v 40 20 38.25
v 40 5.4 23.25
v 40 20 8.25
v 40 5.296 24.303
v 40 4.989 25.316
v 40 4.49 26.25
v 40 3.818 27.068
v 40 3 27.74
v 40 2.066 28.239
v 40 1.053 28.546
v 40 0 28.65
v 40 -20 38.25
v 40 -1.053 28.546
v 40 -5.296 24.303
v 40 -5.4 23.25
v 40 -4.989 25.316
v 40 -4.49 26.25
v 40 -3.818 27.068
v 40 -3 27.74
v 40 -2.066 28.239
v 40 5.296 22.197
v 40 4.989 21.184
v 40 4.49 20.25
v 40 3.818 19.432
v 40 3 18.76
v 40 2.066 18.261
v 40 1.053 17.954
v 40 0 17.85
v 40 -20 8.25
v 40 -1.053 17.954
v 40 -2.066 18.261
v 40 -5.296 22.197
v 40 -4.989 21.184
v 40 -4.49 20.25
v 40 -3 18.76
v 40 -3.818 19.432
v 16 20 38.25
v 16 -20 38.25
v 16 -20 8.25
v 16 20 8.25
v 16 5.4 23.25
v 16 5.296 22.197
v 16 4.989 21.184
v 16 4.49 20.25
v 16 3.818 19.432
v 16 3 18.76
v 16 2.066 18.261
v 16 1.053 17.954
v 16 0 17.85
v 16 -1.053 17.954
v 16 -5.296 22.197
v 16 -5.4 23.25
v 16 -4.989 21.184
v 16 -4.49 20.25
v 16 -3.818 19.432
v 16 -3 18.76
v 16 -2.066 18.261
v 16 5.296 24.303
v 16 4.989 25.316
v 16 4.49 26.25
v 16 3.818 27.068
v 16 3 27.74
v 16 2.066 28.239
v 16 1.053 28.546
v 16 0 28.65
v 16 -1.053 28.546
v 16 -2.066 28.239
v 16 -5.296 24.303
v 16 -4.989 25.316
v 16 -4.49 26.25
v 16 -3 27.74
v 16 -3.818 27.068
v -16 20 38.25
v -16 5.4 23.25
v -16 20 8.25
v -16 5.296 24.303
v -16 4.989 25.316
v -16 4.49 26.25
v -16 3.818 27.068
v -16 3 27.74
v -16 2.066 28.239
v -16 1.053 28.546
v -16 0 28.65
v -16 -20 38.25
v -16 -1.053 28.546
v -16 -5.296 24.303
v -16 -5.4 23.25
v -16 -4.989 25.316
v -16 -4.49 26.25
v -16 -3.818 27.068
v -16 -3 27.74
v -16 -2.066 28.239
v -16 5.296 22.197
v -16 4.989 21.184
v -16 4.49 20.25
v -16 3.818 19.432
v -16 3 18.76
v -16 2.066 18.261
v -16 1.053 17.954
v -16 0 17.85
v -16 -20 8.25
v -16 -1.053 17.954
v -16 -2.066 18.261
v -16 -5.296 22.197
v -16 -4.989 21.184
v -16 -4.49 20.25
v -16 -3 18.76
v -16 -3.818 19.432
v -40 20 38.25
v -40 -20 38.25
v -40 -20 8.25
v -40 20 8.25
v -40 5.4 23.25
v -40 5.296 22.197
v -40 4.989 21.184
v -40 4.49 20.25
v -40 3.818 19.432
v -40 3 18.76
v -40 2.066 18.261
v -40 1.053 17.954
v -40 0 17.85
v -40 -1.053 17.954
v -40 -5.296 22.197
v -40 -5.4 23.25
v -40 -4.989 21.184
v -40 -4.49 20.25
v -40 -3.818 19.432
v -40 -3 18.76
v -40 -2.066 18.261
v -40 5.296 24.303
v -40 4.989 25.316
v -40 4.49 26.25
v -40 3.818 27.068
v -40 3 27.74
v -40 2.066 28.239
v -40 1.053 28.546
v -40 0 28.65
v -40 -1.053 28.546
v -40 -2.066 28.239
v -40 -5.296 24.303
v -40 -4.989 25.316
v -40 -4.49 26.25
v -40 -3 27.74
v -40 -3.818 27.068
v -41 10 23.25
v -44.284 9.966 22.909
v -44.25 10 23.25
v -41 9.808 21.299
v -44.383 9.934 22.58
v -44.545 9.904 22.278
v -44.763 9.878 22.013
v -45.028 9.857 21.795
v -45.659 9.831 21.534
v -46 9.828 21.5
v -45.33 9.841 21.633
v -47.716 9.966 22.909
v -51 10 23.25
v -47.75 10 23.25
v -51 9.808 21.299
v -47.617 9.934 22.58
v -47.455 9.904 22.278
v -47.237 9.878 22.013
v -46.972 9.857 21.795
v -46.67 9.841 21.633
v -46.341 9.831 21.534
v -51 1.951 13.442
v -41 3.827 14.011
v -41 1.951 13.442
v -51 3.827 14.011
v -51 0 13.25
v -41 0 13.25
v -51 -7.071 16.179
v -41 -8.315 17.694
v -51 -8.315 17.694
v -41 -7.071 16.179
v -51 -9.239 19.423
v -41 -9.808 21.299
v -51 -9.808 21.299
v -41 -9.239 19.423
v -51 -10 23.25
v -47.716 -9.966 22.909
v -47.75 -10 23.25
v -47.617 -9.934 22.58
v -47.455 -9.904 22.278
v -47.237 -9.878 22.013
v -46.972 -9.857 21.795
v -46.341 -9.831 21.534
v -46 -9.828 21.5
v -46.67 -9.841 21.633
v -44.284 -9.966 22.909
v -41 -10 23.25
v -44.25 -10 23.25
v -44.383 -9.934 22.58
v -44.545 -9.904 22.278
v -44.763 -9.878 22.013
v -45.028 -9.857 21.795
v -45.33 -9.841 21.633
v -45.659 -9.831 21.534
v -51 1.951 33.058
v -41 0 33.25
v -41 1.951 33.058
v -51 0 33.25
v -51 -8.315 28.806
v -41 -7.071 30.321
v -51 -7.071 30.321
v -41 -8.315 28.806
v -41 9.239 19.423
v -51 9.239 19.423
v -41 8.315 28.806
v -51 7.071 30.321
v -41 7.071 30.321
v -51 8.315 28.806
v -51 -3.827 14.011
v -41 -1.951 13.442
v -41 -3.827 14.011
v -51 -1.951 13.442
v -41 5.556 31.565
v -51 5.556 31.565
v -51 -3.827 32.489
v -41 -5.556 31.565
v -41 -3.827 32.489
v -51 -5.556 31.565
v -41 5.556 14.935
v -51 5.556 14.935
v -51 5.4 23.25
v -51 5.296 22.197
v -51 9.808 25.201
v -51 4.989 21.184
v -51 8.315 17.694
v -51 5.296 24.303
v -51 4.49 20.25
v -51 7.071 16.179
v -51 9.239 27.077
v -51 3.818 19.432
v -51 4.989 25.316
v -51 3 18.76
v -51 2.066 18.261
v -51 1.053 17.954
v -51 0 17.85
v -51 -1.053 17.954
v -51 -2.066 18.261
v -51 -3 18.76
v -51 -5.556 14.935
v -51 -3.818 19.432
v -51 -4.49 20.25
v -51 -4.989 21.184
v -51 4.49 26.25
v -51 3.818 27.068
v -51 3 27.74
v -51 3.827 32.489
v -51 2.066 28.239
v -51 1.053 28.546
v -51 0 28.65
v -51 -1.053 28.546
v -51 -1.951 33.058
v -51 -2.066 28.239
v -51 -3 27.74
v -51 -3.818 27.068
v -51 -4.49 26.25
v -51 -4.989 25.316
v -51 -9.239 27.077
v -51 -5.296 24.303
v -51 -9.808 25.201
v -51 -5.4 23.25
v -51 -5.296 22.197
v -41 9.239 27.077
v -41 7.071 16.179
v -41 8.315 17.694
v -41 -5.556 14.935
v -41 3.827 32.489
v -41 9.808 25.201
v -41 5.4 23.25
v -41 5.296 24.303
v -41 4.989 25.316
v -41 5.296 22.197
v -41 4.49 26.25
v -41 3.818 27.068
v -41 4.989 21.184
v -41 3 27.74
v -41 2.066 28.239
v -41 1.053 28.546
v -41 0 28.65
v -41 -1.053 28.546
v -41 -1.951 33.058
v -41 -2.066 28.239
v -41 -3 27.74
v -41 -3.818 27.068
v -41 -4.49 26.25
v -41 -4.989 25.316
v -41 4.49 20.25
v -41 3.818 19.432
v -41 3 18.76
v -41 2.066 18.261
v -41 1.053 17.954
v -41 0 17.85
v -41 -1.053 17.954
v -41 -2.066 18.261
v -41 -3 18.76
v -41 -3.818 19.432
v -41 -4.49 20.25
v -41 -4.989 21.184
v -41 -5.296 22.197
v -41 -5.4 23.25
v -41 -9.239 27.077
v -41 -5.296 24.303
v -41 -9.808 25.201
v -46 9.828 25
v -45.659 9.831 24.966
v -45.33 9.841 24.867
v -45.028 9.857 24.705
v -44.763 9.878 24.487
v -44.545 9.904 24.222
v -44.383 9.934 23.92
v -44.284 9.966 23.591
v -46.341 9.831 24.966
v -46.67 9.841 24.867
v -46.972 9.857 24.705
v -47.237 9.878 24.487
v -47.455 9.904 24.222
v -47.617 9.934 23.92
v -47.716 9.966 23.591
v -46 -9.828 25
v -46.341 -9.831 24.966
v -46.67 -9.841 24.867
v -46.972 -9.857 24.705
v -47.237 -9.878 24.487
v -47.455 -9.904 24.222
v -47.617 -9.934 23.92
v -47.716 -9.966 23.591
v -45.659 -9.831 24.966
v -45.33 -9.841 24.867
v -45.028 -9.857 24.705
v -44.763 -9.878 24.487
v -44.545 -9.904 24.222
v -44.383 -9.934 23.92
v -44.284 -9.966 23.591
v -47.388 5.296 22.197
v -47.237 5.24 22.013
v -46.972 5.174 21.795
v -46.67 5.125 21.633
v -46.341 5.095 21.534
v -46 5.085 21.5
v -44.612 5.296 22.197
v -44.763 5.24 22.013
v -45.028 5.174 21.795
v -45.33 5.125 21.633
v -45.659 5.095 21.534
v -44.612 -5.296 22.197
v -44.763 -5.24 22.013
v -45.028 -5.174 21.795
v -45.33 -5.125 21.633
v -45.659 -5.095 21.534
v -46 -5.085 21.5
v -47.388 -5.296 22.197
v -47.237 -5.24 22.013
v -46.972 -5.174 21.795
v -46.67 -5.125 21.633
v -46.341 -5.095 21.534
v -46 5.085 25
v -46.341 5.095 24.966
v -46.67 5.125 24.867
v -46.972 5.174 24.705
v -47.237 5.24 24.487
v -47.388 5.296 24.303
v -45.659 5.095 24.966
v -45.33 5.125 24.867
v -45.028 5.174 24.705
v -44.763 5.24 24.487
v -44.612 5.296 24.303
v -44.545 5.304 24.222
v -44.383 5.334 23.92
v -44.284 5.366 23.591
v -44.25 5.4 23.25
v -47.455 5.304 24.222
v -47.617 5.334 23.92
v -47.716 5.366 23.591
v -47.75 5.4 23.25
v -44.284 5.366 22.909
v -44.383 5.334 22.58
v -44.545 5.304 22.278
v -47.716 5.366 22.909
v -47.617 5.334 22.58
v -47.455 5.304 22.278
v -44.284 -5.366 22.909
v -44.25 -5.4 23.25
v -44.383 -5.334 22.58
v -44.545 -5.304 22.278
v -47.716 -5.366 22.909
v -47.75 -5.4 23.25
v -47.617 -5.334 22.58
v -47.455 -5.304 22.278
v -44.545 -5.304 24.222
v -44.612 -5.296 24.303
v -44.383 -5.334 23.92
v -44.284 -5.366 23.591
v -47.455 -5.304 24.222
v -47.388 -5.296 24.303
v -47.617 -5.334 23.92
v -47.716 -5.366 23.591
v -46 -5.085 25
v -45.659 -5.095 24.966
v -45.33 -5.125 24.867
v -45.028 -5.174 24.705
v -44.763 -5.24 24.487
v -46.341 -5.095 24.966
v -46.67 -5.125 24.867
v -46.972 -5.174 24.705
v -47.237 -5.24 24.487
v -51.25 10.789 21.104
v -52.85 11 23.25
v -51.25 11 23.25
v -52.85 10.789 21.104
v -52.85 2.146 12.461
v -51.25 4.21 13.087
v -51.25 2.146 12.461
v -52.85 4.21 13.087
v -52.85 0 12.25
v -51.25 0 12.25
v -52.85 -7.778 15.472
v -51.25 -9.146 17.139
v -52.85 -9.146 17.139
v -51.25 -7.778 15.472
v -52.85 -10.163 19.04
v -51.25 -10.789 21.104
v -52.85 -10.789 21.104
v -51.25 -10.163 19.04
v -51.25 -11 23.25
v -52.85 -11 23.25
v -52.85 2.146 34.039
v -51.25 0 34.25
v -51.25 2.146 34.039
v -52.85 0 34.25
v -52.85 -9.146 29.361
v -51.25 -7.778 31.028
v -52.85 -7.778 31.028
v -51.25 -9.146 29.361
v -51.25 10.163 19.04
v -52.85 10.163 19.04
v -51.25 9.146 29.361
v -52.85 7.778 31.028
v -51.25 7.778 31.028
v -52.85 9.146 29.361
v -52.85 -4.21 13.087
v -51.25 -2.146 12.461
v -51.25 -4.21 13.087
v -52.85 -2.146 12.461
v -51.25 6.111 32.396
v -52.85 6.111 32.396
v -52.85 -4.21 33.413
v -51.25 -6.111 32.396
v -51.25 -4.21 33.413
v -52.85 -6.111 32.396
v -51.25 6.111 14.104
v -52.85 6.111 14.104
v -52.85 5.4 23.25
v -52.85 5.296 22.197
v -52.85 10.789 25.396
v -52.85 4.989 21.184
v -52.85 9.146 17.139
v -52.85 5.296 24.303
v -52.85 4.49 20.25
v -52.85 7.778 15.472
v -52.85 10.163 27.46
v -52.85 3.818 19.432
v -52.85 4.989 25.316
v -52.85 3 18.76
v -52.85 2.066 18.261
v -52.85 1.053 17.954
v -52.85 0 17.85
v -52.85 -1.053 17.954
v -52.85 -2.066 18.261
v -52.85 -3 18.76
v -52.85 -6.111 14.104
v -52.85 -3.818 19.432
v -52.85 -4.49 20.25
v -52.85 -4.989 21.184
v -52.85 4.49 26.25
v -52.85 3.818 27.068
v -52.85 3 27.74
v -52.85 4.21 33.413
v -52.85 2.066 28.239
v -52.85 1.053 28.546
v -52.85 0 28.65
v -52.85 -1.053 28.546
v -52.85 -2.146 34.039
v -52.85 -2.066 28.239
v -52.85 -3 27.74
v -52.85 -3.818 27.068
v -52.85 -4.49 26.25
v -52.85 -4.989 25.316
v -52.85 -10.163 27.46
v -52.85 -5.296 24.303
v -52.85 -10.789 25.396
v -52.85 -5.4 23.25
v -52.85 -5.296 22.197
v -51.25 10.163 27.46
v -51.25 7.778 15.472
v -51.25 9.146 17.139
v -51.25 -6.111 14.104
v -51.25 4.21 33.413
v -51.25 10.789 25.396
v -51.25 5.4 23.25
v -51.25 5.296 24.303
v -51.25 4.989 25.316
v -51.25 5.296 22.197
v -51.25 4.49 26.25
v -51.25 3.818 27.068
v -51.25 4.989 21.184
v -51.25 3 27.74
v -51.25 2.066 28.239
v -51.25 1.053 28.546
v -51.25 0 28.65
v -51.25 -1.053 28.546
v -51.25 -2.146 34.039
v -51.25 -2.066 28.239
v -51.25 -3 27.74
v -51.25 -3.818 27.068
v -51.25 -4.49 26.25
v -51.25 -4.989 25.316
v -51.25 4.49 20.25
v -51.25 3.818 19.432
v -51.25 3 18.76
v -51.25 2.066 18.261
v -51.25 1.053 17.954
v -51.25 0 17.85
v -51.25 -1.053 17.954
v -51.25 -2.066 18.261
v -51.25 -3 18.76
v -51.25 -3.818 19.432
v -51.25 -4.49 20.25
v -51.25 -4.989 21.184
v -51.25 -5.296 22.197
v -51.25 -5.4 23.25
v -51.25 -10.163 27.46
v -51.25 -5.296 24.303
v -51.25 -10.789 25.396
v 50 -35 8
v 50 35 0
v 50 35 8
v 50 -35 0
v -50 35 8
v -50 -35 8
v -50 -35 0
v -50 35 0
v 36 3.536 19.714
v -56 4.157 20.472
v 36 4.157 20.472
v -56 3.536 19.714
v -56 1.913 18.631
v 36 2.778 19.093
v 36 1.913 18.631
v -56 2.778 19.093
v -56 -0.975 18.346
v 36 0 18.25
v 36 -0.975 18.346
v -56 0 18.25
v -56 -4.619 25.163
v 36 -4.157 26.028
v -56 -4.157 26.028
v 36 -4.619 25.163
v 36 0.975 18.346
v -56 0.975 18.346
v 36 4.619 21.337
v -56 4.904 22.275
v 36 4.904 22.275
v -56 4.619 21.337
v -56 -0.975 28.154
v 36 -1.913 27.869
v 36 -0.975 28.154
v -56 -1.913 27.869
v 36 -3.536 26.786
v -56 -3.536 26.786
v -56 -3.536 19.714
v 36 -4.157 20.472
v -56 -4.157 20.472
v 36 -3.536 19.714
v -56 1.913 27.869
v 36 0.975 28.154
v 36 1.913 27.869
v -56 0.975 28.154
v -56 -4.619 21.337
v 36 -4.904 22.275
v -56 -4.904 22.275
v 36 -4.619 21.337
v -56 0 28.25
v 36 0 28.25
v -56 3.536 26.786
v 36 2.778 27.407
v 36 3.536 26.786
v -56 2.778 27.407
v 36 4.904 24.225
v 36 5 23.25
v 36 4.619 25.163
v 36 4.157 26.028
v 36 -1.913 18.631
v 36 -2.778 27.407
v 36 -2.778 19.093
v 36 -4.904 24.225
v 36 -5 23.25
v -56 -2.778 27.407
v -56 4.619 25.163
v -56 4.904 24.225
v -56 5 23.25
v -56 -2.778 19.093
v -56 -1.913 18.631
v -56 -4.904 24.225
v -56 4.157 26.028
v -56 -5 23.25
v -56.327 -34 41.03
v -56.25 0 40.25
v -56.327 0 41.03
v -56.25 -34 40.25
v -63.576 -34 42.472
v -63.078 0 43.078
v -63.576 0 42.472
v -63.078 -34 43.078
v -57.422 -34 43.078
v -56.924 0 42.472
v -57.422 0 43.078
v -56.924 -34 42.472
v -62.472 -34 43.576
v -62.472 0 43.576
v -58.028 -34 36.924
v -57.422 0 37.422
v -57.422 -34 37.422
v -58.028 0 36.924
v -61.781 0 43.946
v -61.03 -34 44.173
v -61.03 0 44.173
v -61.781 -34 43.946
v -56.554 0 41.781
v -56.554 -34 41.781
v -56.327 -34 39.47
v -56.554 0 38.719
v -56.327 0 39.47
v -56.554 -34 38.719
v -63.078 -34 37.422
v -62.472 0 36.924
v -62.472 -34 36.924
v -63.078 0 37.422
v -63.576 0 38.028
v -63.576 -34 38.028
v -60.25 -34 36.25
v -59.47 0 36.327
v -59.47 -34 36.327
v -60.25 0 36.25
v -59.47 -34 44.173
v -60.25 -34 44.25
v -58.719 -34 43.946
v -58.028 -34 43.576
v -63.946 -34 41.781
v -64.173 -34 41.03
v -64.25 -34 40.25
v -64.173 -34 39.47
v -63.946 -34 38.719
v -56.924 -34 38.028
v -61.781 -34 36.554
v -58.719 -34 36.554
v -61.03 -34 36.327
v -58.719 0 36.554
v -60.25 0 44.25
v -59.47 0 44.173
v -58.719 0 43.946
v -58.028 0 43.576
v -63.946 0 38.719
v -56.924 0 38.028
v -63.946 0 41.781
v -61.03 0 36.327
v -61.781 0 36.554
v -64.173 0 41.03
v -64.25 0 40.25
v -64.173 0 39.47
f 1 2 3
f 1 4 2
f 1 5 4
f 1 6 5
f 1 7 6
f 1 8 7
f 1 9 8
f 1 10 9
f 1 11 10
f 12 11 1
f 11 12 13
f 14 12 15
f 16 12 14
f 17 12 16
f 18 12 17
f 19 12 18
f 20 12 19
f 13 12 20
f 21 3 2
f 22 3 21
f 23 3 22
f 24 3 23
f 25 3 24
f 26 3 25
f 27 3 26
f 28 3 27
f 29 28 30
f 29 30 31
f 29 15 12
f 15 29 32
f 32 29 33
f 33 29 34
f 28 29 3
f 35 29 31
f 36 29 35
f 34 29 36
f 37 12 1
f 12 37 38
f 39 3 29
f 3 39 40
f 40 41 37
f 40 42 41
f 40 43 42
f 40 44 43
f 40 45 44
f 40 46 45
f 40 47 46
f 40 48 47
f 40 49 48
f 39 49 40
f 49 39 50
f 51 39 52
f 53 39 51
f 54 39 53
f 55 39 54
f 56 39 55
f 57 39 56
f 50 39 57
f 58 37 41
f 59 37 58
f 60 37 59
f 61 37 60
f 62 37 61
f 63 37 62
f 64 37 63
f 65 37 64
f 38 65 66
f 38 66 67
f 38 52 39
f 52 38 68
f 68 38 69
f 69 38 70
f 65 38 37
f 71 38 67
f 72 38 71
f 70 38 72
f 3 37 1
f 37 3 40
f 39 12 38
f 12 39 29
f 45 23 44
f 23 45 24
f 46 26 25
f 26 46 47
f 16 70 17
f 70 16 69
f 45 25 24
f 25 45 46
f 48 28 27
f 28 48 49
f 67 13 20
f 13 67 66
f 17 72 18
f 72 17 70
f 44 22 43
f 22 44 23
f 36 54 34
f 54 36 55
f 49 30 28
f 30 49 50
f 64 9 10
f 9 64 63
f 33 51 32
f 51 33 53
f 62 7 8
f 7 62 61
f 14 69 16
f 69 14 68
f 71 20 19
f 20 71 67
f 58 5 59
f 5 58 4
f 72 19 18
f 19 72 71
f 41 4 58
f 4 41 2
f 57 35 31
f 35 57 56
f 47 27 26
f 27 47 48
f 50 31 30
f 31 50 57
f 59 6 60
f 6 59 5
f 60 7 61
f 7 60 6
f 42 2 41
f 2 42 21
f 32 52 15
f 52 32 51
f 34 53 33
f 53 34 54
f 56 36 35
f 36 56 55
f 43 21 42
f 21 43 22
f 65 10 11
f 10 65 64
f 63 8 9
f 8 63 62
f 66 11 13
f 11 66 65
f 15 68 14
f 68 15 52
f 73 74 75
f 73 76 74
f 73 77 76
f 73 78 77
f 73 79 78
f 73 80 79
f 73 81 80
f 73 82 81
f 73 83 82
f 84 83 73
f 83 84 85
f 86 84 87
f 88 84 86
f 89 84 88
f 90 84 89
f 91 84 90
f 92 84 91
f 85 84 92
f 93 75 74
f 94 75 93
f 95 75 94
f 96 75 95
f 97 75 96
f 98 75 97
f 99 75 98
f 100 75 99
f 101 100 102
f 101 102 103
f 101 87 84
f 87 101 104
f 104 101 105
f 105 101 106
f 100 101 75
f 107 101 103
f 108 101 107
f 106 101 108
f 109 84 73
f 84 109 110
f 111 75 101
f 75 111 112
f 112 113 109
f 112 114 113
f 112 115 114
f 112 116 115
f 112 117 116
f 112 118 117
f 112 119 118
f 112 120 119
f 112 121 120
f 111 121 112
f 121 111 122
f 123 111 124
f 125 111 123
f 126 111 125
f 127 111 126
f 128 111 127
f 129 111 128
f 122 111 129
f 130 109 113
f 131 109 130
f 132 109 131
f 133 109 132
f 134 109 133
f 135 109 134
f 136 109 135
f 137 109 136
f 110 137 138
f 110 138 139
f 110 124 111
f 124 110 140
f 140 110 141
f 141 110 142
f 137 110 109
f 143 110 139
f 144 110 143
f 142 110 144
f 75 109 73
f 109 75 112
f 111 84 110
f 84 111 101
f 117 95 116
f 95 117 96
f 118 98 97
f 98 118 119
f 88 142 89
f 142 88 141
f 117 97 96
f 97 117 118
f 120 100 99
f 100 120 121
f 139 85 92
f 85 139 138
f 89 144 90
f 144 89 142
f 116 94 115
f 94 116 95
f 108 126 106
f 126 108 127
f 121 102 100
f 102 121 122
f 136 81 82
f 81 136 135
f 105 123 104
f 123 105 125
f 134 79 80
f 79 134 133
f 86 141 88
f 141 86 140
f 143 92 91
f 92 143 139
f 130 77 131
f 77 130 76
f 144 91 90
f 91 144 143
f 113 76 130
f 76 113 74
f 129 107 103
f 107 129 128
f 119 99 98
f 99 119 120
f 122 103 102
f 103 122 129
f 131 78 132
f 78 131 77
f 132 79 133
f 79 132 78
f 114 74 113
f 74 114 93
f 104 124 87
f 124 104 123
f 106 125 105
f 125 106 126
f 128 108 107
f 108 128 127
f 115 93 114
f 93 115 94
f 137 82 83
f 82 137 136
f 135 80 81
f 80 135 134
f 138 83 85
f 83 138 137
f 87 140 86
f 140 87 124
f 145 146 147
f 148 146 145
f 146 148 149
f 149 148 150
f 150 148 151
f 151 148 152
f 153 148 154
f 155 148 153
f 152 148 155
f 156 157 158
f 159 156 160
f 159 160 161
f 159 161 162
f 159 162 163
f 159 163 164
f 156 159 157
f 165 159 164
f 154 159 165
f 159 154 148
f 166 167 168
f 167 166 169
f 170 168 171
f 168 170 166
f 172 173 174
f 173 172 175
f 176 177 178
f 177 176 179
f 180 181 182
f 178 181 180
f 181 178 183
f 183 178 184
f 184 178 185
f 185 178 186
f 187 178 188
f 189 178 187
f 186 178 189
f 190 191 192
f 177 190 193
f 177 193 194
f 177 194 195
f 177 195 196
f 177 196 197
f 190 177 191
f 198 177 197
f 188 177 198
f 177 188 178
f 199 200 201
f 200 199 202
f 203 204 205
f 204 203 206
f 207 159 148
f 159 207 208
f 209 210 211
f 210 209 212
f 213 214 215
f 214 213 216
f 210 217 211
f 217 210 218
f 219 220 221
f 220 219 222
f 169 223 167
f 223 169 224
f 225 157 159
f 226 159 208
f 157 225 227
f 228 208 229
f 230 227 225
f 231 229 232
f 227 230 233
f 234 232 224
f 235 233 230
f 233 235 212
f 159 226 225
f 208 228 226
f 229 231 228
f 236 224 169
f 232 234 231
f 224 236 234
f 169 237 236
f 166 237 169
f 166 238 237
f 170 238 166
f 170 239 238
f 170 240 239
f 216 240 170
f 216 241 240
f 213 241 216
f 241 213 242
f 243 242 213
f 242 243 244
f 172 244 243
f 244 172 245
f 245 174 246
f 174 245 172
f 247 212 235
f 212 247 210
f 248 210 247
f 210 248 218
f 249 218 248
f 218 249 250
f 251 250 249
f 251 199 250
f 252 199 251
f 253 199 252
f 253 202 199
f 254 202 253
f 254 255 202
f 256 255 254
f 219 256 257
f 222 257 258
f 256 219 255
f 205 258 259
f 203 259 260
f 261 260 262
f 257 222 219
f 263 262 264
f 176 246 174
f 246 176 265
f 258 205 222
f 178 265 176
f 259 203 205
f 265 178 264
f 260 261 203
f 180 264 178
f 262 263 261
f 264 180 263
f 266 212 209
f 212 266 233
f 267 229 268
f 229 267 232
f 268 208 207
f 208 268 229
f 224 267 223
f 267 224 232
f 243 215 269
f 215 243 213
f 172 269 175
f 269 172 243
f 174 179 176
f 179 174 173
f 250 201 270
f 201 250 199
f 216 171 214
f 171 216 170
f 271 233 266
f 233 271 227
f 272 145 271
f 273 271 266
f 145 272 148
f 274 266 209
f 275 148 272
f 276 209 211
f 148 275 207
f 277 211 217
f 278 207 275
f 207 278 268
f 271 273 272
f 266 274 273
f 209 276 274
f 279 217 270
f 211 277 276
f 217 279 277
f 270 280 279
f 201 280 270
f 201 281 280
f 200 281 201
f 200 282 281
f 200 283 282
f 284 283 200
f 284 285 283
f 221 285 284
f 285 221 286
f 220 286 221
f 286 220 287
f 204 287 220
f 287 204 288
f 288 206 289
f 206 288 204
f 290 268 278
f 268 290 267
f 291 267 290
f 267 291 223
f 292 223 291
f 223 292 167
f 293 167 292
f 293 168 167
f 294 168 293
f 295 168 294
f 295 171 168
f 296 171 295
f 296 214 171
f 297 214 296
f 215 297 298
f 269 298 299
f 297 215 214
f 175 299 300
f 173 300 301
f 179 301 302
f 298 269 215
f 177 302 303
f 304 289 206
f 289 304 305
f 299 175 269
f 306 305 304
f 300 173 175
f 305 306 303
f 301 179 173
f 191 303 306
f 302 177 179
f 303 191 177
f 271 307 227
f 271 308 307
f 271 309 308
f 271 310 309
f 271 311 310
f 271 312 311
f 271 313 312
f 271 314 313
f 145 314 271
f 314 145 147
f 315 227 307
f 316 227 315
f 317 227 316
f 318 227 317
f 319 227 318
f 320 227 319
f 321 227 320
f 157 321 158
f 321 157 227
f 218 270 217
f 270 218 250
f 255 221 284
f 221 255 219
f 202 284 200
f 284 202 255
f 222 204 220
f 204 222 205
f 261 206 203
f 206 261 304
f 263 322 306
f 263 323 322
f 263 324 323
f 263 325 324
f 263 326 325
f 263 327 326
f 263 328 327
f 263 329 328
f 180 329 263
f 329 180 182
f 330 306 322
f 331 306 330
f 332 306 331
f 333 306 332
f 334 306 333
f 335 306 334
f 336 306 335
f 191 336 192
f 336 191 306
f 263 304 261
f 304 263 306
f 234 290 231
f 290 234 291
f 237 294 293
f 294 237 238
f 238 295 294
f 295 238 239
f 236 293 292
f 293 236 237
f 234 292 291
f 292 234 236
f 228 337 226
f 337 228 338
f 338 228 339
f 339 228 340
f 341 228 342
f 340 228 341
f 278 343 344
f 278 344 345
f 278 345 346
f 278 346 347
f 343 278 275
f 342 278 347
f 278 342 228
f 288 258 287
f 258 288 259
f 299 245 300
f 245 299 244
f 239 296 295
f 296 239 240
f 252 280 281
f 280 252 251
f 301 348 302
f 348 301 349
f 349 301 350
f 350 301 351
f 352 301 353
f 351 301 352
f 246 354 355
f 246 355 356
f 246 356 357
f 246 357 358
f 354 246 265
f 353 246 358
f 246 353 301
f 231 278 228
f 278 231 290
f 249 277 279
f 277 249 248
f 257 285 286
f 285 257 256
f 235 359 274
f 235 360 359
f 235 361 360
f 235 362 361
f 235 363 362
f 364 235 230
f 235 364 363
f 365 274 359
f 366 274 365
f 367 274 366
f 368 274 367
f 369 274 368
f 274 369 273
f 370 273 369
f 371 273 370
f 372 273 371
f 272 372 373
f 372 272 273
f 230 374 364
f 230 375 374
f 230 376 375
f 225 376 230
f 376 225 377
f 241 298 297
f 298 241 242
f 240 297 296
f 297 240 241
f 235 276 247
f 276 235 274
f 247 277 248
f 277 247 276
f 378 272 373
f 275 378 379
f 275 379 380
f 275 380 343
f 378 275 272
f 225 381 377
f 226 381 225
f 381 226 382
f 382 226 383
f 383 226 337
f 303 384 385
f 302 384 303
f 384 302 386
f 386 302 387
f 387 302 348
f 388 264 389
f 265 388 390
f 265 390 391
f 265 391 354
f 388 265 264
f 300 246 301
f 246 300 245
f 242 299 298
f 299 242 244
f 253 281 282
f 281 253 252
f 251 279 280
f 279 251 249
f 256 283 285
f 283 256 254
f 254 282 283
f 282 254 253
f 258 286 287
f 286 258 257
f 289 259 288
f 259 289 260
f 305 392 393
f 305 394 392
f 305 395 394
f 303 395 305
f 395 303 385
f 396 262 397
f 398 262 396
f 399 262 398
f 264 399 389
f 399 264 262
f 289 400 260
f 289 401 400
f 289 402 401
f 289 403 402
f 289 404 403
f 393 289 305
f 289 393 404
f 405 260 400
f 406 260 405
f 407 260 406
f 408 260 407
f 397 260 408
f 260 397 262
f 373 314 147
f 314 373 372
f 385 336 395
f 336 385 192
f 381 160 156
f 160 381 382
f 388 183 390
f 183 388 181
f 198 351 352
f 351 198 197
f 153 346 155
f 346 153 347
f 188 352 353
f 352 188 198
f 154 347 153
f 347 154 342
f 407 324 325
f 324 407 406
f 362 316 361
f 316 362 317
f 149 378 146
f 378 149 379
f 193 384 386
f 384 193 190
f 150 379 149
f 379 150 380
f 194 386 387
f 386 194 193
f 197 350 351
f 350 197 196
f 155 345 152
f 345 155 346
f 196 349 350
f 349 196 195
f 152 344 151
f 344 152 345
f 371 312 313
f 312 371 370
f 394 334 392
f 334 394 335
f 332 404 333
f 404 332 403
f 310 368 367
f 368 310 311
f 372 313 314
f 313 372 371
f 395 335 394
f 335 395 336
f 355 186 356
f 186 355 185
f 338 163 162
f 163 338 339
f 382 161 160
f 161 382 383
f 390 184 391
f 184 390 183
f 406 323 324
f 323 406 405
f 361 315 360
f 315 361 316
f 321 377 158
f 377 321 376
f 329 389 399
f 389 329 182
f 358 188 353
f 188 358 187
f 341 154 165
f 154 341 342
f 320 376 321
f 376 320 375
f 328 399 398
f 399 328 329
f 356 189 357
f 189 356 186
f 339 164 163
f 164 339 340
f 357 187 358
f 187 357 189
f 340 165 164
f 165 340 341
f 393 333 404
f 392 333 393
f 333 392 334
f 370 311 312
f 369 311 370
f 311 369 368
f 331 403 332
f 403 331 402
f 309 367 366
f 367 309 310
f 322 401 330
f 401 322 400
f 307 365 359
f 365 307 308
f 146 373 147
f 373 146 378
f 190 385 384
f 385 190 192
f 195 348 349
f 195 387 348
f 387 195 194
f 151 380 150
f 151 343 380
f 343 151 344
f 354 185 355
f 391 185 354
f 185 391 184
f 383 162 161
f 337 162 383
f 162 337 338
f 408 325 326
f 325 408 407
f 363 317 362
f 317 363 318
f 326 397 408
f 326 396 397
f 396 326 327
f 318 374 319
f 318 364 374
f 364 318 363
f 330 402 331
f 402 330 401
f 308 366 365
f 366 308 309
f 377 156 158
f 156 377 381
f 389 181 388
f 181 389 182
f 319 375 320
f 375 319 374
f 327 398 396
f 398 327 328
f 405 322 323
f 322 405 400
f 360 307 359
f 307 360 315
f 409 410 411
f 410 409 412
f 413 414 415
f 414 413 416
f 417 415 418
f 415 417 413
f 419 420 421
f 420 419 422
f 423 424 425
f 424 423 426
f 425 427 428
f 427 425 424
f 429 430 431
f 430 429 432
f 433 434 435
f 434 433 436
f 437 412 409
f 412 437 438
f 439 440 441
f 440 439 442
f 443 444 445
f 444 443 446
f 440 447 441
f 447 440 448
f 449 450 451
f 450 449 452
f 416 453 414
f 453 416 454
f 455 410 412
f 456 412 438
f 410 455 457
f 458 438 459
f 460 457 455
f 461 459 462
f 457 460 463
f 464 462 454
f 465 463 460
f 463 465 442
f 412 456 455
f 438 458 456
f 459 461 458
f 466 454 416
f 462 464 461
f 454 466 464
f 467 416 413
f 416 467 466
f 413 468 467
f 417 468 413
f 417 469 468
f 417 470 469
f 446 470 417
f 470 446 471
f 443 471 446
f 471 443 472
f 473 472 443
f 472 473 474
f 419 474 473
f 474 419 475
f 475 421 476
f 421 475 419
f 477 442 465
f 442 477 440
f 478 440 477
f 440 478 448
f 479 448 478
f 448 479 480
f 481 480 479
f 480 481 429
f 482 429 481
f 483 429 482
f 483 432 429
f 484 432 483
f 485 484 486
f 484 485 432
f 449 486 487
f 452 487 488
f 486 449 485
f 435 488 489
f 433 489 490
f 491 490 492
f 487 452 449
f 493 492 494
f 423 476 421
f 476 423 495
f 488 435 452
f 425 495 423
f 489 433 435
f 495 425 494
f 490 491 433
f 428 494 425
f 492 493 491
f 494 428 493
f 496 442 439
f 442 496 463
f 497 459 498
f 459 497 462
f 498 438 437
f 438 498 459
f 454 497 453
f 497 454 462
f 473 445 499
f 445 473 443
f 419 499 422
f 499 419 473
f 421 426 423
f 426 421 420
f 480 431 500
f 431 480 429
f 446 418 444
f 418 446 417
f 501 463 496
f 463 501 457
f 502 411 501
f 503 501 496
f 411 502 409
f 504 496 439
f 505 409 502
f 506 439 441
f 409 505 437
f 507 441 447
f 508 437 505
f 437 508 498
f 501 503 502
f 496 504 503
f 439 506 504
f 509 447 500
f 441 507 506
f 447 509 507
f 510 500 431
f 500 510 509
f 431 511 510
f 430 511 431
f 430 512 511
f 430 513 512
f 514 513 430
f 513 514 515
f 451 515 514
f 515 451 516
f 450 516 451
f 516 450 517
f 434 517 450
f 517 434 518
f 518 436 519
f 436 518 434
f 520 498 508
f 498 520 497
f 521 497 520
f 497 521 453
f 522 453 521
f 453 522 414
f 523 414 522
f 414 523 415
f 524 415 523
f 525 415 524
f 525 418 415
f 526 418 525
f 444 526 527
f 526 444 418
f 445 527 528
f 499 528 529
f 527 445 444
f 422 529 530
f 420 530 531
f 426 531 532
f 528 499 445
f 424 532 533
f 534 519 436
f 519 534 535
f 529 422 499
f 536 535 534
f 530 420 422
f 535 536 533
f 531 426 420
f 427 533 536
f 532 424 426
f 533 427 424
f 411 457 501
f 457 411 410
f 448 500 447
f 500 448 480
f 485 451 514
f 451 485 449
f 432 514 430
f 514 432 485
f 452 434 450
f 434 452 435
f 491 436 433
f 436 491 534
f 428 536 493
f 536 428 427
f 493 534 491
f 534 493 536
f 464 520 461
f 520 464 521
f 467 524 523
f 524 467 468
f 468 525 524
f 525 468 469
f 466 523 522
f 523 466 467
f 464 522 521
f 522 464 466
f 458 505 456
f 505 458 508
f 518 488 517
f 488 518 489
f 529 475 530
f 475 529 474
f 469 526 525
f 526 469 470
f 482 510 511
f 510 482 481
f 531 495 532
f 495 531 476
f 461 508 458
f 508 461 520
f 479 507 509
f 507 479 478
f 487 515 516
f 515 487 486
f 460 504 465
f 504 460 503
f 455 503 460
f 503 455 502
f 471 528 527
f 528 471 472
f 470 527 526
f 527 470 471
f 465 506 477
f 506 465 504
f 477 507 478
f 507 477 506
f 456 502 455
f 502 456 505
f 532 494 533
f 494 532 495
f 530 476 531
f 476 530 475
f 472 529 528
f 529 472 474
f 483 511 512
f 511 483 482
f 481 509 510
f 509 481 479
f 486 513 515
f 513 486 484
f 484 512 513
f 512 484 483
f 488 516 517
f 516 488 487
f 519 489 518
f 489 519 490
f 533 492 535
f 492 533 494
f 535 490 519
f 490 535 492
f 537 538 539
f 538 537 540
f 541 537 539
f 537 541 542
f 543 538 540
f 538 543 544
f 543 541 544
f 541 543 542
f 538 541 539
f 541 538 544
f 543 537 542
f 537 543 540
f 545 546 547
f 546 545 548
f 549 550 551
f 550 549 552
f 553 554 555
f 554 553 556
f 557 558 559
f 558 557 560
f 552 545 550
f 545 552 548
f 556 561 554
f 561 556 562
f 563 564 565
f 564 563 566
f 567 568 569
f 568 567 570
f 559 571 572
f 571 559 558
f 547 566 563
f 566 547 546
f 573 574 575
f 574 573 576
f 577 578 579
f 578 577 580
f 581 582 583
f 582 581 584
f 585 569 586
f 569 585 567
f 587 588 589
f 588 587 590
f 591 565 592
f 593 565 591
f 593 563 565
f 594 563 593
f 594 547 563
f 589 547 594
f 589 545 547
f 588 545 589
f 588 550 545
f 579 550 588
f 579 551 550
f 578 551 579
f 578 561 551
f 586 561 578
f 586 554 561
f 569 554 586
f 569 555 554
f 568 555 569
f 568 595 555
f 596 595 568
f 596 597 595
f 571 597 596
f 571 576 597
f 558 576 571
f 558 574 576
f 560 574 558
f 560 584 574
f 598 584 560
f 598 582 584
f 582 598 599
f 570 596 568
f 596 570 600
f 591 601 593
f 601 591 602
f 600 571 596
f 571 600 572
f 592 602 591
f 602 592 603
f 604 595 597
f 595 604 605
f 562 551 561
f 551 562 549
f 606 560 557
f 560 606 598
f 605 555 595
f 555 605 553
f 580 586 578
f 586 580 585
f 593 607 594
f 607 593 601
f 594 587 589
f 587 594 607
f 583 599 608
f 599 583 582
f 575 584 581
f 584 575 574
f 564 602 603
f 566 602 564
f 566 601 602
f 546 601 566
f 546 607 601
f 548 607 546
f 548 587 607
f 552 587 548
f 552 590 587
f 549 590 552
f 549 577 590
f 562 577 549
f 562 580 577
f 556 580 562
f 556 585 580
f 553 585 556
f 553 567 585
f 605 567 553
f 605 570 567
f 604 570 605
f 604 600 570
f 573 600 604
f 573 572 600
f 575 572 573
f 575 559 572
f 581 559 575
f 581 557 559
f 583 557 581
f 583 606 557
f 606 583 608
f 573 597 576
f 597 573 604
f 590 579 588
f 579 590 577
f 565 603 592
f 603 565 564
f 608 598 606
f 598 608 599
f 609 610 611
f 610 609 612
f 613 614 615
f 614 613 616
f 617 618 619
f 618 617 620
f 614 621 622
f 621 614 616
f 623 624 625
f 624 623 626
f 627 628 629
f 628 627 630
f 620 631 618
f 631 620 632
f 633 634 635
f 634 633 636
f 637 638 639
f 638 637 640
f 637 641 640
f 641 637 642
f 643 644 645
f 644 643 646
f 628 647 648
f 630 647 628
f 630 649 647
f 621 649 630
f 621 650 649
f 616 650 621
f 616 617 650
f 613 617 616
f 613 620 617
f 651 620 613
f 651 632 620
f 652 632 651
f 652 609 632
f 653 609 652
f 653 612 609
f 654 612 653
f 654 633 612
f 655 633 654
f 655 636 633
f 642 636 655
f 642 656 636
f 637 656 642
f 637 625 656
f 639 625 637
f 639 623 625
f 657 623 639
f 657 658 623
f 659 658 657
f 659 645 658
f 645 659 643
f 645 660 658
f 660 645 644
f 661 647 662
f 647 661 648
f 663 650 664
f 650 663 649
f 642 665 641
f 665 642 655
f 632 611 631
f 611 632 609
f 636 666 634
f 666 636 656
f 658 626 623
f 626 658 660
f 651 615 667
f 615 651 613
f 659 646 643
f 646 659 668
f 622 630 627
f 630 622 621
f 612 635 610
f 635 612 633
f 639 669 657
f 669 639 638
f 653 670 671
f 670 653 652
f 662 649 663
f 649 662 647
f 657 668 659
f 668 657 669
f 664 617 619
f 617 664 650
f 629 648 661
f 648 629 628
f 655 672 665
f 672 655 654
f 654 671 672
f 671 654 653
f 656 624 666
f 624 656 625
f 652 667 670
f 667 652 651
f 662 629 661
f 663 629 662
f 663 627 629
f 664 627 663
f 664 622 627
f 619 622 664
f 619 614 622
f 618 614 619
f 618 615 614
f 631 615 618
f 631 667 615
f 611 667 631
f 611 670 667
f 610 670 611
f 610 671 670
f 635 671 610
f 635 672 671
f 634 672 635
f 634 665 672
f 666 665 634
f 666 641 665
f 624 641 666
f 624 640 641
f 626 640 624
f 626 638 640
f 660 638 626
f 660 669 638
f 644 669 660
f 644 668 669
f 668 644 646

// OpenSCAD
$fn = 32;

// ------------------------------------------------------------------------
// Machine vise: screw d10, jaws 24 x 30 mm
// Every part is its own module, assembly() places every instance.
// ------------------------------------------------------------------------

// --- part 1 ---
module vise_bed() {
  difference() {
    translate([-50, -35, 0]) cube([100, 70, 8]);
  }
}

// --- part 2 ---
module vise_jaw() {
  difference() {
    translate([-12, -20, 0]) cube([24, 40, 30]);
    translate([0, 0, 15]) rotate([0, 90, 0]) cylinder(h = 26, d = 10.8, center = true);
  }
}

// --- part 3 ---
module vise_screw() {
  translate([0, 0, -46]) cylinder(h = 92, d = 10);
}

// --- part 4 ---
module screw_collar() {
  difference() {
    cylinder(h = 10, d = 20);
    translate([0, 0, -1]) cylinder(h = 12, d = 10.8);
    translate([0, 0, 5]) rotate([90, 0, 0]) cylinder(h = 22, d = 3.5, center = true);
  }
}

// --- part 5 ---
module screw_washer() {
  difference() {
      translate([0, 0, 0]) cylinder(h = 1.6, d = 22);
      translate([0, 0, -1]) cylinder(h = 3.6, d = 10.8);
    }
}

// --- part 6 ---
module vise_handle() {
  cylinder(h = 34, d = 8);
}

// --- assembly ---
module assembly() {
  color([0.80, 0.24, 0.20]) translate([0, 0, 0]) rotate([0, 0, 0]) vise_bed();
  color([0.20, 0.45, 0.75]) translate([28, 0, 8.25]) rotate([0, 0, 0]) vise_jaw();
  color([0.25, 0.62, 0.32]) translate([-28, 0, 8.25]) rotate([0, 0, 0]) vise_jaw();
  color([0.92, 0.70, 0.18]) translate([-10, 0, 23.25]) rotate([0, 90, 0]) vise_screw();
  color([0.58, 0.35, 0.70]) translate([-51, 0, 23.25]) rotate([0, 90, 0]) screw_collar();
  color([0.16, 0.66, 0.66]) translate([-52.85, 0, 23.25]) rotate([0, 90, 0]) screw_washer();
  color([0.85, 0.48, 0.18]) translate([-60.25, 0, 40.25]) rotate([90, 0, 0]) vise_handle();
}

assembly();
